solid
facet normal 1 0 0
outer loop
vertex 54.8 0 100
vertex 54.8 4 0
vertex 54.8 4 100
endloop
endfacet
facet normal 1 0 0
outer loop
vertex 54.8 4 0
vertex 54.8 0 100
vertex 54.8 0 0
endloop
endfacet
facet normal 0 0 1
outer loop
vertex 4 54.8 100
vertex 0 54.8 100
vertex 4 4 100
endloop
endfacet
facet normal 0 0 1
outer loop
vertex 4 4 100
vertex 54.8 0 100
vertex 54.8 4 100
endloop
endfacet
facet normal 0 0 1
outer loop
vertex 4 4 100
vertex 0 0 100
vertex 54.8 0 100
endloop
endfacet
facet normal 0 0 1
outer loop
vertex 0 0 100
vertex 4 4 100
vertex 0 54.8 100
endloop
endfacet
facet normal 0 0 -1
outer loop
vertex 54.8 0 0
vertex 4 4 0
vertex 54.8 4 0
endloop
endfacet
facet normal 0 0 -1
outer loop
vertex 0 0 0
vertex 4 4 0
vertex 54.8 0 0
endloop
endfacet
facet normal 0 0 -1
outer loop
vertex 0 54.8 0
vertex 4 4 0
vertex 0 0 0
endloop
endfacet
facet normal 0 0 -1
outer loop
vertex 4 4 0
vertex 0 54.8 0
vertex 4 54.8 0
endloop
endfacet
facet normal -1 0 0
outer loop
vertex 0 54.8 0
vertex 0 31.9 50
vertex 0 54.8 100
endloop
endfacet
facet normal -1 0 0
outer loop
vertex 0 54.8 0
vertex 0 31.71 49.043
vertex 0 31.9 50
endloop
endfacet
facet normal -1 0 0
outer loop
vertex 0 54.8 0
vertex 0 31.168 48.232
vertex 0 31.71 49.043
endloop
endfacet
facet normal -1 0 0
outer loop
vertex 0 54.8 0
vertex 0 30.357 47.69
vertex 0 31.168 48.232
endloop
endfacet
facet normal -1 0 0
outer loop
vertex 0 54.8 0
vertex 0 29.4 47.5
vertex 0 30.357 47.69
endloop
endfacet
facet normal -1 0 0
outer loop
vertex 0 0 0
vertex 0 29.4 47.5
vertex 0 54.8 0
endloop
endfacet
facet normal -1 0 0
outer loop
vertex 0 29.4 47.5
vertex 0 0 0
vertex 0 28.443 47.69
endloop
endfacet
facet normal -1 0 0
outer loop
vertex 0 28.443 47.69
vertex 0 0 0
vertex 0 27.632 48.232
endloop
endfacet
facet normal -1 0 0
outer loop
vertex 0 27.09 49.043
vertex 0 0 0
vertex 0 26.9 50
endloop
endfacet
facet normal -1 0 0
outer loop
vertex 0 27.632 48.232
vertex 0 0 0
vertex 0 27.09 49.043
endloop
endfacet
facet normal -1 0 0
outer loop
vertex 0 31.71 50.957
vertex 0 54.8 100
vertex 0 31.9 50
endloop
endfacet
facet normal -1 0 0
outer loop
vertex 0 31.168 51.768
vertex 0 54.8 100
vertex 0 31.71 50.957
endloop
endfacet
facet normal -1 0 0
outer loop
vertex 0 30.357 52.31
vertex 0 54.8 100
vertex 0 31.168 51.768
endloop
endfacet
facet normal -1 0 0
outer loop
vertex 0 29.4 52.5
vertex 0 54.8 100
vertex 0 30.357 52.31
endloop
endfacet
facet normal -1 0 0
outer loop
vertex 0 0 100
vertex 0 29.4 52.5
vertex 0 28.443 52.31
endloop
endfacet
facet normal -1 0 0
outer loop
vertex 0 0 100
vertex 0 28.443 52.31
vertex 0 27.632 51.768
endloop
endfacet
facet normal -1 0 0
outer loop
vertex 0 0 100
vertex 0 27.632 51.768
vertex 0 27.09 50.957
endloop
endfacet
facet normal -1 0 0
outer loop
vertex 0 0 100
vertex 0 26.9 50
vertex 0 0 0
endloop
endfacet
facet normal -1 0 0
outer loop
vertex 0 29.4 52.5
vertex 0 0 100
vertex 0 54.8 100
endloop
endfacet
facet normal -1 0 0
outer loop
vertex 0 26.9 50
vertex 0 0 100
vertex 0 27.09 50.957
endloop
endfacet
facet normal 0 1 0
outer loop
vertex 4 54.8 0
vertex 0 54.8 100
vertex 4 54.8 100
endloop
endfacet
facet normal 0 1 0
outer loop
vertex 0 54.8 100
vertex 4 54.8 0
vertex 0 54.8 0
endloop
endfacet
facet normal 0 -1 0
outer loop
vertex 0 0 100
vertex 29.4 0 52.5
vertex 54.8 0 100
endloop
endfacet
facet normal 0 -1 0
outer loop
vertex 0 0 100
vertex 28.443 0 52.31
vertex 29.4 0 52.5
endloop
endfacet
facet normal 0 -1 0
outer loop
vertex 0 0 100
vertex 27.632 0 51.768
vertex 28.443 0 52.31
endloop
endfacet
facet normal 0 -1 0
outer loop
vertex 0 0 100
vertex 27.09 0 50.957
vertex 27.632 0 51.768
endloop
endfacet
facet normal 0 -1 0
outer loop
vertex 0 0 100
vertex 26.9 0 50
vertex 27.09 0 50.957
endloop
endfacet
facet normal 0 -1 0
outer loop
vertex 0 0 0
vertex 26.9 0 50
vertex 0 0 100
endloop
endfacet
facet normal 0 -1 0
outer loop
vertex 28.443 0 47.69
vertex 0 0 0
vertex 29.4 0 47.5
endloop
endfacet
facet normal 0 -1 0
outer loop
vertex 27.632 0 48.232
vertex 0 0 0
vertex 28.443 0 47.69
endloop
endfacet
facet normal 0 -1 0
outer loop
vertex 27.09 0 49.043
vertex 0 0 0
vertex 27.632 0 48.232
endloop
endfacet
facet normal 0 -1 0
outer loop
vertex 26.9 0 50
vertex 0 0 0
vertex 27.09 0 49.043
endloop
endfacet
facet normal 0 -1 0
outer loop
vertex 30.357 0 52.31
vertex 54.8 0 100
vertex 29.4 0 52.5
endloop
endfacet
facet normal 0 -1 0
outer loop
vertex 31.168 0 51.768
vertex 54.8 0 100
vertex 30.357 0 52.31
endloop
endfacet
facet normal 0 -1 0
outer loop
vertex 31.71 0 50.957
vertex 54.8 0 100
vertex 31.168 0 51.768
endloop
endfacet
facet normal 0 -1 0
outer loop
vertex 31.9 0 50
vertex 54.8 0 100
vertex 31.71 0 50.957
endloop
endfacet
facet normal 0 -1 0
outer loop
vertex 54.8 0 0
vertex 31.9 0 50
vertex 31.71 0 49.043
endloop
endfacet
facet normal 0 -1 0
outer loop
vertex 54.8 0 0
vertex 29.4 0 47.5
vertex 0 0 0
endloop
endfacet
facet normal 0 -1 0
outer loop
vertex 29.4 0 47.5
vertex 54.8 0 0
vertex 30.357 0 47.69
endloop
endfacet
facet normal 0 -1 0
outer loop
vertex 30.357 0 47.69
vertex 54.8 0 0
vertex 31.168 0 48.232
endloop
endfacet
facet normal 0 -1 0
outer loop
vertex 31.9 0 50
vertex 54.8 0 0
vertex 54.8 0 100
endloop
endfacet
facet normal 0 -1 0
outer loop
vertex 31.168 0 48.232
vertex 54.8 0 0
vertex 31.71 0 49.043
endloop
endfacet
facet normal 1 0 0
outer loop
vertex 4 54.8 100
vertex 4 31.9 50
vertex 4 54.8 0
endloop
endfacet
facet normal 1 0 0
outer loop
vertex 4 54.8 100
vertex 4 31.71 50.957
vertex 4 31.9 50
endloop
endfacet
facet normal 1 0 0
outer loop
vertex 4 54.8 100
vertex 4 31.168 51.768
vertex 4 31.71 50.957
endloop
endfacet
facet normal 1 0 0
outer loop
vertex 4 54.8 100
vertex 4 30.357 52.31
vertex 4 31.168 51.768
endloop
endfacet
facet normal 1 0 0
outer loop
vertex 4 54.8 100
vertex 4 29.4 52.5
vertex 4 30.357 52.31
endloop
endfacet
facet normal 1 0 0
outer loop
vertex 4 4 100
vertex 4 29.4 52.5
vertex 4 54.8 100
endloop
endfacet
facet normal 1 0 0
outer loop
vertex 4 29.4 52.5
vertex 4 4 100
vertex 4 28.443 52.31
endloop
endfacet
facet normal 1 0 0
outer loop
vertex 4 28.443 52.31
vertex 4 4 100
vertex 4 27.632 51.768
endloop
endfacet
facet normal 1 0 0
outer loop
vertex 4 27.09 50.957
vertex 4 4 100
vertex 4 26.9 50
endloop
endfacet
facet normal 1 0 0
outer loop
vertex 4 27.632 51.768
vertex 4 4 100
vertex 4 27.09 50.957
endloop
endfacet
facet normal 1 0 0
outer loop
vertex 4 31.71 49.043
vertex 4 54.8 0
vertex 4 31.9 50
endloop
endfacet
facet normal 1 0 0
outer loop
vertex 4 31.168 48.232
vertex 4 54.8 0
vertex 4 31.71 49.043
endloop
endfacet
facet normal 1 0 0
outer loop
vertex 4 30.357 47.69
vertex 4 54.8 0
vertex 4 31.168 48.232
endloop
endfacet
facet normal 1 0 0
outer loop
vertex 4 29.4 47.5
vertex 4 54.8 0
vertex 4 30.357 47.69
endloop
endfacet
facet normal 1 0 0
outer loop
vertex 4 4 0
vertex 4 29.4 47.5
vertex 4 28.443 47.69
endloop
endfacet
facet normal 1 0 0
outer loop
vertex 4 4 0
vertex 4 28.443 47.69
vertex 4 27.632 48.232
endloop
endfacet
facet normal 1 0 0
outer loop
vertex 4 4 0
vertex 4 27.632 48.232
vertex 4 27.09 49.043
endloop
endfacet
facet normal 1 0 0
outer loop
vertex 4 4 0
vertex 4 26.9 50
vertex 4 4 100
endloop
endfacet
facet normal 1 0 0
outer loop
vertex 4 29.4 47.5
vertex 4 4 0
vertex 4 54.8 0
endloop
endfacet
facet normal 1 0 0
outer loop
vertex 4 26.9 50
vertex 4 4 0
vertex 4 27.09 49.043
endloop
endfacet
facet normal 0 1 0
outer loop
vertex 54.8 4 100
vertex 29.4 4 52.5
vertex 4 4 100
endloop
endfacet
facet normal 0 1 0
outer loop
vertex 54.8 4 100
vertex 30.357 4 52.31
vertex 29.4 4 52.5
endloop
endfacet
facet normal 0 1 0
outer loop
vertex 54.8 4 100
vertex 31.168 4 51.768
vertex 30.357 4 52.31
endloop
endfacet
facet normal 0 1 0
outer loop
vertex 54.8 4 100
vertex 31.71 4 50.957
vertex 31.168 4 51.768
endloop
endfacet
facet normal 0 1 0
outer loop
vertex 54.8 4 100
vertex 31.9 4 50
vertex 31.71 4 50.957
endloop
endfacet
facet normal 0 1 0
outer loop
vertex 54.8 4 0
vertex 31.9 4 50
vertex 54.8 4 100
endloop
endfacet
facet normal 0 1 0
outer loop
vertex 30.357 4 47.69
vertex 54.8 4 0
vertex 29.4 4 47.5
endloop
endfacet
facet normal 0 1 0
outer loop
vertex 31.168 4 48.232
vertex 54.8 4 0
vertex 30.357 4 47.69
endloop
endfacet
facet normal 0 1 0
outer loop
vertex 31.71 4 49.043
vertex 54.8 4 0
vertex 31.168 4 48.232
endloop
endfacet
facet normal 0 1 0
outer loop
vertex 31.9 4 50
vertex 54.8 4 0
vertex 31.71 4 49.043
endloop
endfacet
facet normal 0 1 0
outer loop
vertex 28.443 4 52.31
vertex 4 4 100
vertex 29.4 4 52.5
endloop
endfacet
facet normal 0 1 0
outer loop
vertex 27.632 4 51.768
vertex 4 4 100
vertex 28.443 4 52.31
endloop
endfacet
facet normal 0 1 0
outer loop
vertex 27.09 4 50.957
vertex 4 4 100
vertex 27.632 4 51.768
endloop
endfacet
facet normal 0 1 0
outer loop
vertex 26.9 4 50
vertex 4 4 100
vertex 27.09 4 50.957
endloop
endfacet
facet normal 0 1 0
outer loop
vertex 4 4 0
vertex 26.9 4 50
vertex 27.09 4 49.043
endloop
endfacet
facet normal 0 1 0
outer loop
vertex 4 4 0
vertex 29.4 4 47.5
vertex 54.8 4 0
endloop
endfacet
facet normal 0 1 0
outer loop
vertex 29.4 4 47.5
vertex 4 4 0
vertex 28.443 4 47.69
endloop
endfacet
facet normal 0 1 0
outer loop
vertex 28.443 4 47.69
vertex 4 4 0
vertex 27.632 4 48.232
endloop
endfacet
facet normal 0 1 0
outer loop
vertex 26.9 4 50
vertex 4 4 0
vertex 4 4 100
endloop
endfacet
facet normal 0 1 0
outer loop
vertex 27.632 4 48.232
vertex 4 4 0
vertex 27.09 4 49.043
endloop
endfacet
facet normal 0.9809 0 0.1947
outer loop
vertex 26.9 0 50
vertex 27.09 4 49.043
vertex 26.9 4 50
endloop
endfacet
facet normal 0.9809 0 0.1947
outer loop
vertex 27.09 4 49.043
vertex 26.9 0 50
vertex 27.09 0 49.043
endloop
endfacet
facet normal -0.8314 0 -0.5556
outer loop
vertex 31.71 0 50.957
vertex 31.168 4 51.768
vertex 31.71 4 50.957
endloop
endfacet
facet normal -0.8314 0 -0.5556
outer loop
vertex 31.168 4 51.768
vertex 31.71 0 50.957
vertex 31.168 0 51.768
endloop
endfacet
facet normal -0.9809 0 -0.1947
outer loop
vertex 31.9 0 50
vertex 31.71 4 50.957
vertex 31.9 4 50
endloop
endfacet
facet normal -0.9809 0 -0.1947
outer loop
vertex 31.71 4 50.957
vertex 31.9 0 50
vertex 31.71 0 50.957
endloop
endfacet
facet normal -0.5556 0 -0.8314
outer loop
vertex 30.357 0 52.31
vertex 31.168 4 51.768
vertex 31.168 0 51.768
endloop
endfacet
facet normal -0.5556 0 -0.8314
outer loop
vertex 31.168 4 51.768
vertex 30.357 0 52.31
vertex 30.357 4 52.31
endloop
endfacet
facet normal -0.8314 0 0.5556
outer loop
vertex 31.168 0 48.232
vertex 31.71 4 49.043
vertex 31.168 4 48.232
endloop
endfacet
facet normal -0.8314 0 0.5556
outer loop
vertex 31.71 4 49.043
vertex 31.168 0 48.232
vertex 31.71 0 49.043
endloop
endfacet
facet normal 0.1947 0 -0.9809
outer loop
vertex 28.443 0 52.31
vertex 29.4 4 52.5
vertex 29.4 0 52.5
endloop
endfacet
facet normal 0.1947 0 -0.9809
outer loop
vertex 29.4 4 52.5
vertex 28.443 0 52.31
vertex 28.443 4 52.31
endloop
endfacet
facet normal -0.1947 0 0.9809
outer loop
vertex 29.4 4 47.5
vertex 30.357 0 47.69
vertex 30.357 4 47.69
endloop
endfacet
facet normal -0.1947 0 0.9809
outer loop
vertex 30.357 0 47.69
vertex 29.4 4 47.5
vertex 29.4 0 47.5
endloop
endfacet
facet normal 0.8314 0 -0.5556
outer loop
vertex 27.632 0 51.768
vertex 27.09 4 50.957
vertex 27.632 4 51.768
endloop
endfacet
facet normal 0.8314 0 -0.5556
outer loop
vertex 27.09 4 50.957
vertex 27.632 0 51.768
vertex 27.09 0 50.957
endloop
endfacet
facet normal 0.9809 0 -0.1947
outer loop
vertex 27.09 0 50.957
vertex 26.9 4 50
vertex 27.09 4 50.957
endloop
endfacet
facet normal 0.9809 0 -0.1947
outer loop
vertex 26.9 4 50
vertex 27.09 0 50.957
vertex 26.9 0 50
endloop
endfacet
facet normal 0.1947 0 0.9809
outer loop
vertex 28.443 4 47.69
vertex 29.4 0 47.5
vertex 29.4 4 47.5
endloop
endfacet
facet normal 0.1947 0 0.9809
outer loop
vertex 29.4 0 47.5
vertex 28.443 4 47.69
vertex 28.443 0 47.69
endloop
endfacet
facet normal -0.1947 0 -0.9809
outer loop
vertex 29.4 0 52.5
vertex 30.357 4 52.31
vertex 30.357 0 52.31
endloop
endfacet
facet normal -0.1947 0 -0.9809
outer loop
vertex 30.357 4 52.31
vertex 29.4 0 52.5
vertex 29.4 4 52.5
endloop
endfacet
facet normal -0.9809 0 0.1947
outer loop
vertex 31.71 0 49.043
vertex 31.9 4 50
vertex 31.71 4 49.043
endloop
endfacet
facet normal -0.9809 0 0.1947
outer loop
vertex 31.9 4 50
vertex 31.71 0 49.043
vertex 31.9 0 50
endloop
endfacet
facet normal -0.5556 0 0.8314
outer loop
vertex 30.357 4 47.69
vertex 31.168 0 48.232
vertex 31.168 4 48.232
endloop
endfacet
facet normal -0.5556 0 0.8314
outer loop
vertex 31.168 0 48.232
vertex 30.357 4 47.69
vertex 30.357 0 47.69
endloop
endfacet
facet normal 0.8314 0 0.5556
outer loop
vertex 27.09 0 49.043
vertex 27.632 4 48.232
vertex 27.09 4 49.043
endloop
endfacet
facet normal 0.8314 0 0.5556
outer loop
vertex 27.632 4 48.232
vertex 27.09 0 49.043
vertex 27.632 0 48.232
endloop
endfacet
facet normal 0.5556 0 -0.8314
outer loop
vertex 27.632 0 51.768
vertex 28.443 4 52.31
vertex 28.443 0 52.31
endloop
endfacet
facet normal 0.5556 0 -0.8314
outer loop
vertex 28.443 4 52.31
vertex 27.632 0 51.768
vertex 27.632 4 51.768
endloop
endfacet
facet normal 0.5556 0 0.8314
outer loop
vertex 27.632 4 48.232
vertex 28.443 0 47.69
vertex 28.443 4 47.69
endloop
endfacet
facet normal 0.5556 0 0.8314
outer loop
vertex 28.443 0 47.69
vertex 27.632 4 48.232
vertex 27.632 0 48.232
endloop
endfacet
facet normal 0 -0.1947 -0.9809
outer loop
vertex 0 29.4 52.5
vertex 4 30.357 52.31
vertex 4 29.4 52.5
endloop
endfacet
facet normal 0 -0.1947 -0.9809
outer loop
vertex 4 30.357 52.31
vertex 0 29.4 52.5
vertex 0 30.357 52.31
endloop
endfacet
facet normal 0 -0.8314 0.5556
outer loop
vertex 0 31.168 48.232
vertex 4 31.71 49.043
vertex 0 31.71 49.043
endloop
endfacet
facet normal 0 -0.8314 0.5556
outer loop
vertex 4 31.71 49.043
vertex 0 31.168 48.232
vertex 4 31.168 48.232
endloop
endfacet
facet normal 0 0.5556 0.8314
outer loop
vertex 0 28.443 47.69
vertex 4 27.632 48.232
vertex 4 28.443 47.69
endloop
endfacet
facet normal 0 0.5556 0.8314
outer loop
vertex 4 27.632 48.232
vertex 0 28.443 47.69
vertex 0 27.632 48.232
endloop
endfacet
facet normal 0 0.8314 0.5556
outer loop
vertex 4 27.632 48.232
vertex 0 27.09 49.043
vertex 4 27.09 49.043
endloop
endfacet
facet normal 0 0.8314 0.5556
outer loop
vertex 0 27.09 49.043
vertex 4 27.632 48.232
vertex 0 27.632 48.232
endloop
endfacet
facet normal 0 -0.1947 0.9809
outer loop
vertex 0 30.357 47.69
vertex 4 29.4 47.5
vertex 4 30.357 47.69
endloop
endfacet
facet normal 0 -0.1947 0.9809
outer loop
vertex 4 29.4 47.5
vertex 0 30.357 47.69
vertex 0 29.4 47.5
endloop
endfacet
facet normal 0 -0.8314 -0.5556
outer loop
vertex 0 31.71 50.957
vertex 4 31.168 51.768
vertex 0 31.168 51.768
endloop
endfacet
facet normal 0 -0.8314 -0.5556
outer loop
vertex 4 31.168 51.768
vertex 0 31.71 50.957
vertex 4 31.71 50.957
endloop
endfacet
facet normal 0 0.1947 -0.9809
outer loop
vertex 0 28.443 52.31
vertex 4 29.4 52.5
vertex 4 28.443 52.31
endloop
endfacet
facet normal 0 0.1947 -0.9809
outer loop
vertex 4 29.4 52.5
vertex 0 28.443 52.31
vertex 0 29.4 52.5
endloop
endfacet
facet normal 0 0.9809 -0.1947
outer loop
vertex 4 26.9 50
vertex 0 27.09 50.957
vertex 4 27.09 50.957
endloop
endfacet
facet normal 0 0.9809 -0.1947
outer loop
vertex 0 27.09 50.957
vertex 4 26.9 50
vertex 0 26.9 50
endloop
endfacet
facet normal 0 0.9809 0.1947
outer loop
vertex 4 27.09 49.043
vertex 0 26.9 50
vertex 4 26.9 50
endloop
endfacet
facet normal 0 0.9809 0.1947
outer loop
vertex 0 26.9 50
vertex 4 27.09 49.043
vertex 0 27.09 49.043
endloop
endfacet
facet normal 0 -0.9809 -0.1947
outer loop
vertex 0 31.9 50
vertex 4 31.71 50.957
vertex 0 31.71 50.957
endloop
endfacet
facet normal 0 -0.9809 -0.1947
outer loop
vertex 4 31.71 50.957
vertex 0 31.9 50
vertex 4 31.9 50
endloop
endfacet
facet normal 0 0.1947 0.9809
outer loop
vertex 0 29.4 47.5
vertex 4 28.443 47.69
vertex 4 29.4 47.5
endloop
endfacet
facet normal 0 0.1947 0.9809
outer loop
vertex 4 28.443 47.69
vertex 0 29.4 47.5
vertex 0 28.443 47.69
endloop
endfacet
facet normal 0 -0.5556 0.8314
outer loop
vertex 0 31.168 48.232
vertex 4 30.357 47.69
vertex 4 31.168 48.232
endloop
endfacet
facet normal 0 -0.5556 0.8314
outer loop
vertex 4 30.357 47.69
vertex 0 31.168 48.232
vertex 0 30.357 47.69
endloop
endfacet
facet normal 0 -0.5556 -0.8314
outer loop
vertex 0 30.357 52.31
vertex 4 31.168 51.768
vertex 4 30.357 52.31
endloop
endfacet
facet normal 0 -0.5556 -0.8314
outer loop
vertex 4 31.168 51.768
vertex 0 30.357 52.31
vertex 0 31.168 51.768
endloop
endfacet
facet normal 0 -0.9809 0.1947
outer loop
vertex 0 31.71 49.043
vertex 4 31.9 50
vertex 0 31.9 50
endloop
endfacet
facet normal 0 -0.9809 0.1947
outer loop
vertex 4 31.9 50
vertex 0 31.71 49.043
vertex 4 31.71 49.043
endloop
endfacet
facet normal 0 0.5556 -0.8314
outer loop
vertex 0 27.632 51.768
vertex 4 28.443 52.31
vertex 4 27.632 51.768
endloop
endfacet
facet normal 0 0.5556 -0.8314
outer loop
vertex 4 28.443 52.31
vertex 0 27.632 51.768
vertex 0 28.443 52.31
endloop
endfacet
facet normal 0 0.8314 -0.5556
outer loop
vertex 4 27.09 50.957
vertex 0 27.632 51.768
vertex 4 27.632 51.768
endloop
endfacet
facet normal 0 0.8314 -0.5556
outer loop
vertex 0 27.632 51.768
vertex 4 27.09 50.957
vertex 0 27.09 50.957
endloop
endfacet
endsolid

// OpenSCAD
include <../lifetrac_v25_params.scad>

module angle_iron_drill_jig() {
    leg = ANGLE_2X2_1_4[0];
    wall = JIG_WALL_THICKNESS;
    length = 100;
    
    difference() {
        cube([leg + wall, leg + wall, length]);
        translate([wall, wall, -1]) cube([leg + 1, leg + 1, length + 2]);
        
        // Drill holes
        translate([wall + leg/2, 0, length/2]) rotate([90,0,0]) cylinder(d=5, h=wall*3, center=true, $fn=16);
        translate([0, wall + leg/2, length/2]) rotate([0,90,0]) cylinder(d=5, h=wall*3, center=true, $fn=16);
    }
}
angle_iron_drill_jig();
